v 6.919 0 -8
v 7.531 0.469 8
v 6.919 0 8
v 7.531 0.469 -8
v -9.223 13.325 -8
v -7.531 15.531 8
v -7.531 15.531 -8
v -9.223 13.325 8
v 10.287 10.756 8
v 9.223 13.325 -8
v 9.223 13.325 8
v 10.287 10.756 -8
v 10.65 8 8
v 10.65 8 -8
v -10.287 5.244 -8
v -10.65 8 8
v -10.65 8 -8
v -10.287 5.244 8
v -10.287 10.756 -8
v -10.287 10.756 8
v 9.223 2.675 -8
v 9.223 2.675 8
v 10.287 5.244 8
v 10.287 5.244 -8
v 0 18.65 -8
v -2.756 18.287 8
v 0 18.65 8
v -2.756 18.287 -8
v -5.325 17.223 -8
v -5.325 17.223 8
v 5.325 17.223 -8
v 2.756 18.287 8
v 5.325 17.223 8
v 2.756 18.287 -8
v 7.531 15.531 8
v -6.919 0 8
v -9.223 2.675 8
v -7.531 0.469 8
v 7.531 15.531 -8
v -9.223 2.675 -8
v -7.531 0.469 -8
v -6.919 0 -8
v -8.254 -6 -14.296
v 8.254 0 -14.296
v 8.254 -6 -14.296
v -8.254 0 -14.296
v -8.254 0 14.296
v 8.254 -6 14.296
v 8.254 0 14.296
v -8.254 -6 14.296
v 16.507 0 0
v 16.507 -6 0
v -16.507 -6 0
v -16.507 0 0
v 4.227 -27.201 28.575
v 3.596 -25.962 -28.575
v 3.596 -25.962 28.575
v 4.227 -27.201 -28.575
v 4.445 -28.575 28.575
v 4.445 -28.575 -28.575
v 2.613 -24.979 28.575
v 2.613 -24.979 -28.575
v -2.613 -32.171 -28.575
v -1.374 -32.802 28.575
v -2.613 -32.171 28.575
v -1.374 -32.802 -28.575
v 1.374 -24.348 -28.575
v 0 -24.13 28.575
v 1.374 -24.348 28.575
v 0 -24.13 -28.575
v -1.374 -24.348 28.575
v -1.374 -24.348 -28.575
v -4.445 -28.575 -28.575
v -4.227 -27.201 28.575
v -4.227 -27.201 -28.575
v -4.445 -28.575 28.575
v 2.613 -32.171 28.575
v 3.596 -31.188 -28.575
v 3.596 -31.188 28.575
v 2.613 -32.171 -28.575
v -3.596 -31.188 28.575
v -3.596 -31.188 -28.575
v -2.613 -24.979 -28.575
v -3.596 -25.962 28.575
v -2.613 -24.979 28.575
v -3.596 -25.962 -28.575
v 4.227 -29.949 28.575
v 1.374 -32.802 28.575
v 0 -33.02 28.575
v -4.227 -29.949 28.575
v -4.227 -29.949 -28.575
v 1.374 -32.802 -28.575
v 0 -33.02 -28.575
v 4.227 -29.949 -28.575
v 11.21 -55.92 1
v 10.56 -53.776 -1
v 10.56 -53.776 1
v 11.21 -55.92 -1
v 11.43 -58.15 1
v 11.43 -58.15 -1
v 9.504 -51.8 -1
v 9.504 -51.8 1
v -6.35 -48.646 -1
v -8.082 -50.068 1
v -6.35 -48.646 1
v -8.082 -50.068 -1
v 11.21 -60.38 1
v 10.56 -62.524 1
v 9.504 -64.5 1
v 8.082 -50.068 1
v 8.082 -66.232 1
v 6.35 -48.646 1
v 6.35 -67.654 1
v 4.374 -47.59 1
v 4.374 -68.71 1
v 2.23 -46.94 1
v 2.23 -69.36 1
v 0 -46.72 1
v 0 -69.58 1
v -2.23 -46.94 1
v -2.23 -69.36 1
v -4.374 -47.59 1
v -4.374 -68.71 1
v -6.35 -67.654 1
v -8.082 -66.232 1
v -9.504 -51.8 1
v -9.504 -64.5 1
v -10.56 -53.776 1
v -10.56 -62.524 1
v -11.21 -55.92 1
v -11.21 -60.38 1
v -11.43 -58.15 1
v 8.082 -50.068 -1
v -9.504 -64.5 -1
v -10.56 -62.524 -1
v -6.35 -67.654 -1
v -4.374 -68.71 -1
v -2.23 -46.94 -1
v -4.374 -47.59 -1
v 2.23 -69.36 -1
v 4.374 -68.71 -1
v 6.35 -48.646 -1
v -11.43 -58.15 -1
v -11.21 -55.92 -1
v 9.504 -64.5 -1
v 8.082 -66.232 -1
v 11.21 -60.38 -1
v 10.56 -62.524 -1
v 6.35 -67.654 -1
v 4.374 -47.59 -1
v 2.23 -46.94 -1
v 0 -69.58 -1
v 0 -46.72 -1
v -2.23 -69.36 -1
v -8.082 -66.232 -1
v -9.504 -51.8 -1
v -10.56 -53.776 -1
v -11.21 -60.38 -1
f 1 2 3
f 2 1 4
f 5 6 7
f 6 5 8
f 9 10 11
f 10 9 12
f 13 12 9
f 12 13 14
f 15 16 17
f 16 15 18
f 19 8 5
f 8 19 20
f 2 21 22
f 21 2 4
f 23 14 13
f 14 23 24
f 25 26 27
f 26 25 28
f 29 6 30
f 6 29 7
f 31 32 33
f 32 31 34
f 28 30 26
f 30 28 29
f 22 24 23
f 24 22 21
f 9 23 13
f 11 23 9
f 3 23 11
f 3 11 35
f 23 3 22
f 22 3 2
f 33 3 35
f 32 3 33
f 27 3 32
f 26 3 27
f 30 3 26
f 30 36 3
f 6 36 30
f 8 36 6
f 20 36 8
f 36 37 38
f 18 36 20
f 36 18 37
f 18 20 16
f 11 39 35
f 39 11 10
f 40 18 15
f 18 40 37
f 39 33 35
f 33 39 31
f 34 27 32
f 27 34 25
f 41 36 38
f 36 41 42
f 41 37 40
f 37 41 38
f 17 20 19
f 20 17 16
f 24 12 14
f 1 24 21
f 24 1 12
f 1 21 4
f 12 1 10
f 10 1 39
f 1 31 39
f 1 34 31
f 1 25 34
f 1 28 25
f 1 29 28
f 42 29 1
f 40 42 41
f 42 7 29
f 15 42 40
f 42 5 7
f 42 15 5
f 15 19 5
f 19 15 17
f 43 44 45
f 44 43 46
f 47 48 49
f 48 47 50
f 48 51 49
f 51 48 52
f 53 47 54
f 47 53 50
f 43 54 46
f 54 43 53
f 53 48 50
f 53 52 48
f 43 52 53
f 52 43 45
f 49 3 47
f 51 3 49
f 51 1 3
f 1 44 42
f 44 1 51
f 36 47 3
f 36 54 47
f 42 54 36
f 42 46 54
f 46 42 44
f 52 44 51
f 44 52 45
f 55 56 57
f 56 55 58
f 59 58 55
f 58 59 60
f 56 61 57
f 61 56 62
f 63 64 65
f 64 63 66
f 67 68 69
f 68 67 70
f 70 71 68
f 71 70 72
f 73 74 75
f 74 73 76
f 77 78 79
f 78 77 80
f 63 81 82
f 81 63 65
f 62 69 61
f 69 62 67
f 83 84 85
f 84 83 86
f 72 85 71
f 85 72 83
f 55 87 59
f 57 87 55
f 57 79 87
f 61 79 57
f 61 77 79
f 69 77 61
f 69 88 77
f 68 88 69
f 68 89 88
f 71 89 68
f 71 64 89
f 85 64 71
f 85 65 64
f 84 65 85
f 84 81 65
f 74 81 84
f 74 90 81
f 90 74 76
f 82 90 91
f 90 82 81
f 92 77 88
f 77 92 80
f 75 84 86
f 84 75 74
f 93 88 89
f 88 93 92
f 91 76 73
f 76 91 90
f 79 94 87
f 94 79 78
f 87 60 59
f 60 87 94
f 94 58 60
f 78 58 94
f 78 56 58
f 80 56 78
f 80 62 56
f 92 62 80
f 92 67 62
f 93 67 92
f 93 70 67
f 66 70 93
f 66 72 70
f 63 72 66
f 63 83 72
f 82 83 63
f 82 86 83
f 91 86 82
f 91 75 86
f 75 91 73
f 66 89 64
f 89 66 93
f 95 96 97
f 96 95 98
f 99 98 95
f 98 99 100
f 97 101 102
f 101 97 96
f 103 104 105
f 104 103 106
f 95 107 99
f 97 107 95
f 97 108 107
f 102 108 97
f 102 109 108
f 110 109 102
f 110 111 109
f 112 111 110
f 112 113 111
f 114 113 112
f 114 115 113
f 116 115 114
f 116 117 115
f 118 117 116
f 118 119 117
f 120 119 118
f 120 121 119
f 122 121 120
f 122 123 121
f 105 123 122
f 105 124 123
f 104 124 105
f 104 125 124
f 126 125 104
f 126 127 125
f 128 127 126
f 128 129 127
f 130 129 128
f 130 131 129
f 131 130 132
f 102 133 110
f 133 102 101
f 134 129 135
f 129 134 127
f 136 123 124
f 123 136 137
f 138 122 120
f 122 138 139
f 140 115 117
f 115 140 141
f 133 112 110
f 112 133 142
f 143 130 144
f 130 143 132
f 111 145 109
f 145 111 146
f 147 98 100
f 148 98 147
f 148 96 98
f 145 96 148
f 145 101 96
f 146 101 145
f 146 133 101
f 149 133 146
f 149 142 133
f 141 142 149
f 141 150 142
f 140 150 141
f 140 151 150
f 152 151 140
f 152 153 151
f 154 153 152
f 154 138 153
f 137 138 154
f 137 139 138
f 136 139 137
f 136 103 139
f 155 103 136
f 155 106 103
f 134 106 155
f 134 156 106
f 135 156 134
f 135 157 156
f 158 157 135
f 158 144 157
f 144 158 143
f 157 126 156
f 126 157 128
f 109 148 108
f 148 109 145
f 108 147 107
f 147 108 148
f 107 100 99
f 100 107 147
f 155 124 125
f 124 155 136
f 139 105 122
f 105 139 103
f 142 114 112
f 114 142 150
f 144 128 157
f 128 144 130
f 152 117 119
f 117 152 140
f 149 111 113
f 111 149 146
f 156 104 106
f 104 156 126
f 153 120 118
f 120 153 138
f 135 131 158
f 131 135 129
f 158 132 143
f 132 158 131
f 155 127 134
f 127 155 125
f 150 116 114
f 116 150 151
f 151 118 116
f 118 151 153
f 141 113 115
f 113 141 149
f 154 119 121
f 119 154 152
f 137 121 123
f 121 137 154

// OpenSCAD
// Auto-generated by scripts/author_from_manifest.py (Phase D.3).
// Source: data/phase_d_manifest.json (sku_intent='reliable-f1fr56-qr-pendent-155f').
// Do not hand-edit — regenerate from the manifest.
//
// @part reliable_f1fr56_qr_pendent_155f
// @kind sprinkler_head
// @category head.pendant.k56
// @display-name "Reliable F1FR56 QR Pendent K5.6 155°F"
// @mfg reliable_automatic_sprinkler
// @mfg-pn F1FR56
// @listing UL FM
// @hazard-classes LH OH1
// @price-usd 14.25
// @install-minutes 8
// @crew journeyman
// @k-factor 5.6
// @orientation pendant
// @response quick
// @temperature 155F
// @param size_in number default=0.5 label="Size" unit="in"
// @port inlet position=[0,0.014,0] direction=[0,1,0] style=NPT_threaded size_in=0.5 role=drop

size_in = 0.5;
k_factor = 5.6;

length_mm   = 57.15;
body_dia_mm = 25.40;
thread_od   = 21.3;
thread_len  = 16;
deflector_d = body_dia_mm * 0.9;

 union() {
    translate([0, thread_len/2, 0])
        cylinder(h = thread_len, d = thread_od, center = true, $fn = 24);
    translate([0, -3, 0])
        rotate([90, 0, 0])
        cylinder(h = 6, d = thread_od * 1.55, $fn = 6, center = true);
    translate([0, -length_mm/2, 0])
        cylinder(h = length_mm, d = body_dia_mm * 0.35, center = true, $fn = 20);
    translate([0, -length_mm - 1, 0])
        cylinder(h = 2, d = deflector_d, center = true, $fn = 32);
}
